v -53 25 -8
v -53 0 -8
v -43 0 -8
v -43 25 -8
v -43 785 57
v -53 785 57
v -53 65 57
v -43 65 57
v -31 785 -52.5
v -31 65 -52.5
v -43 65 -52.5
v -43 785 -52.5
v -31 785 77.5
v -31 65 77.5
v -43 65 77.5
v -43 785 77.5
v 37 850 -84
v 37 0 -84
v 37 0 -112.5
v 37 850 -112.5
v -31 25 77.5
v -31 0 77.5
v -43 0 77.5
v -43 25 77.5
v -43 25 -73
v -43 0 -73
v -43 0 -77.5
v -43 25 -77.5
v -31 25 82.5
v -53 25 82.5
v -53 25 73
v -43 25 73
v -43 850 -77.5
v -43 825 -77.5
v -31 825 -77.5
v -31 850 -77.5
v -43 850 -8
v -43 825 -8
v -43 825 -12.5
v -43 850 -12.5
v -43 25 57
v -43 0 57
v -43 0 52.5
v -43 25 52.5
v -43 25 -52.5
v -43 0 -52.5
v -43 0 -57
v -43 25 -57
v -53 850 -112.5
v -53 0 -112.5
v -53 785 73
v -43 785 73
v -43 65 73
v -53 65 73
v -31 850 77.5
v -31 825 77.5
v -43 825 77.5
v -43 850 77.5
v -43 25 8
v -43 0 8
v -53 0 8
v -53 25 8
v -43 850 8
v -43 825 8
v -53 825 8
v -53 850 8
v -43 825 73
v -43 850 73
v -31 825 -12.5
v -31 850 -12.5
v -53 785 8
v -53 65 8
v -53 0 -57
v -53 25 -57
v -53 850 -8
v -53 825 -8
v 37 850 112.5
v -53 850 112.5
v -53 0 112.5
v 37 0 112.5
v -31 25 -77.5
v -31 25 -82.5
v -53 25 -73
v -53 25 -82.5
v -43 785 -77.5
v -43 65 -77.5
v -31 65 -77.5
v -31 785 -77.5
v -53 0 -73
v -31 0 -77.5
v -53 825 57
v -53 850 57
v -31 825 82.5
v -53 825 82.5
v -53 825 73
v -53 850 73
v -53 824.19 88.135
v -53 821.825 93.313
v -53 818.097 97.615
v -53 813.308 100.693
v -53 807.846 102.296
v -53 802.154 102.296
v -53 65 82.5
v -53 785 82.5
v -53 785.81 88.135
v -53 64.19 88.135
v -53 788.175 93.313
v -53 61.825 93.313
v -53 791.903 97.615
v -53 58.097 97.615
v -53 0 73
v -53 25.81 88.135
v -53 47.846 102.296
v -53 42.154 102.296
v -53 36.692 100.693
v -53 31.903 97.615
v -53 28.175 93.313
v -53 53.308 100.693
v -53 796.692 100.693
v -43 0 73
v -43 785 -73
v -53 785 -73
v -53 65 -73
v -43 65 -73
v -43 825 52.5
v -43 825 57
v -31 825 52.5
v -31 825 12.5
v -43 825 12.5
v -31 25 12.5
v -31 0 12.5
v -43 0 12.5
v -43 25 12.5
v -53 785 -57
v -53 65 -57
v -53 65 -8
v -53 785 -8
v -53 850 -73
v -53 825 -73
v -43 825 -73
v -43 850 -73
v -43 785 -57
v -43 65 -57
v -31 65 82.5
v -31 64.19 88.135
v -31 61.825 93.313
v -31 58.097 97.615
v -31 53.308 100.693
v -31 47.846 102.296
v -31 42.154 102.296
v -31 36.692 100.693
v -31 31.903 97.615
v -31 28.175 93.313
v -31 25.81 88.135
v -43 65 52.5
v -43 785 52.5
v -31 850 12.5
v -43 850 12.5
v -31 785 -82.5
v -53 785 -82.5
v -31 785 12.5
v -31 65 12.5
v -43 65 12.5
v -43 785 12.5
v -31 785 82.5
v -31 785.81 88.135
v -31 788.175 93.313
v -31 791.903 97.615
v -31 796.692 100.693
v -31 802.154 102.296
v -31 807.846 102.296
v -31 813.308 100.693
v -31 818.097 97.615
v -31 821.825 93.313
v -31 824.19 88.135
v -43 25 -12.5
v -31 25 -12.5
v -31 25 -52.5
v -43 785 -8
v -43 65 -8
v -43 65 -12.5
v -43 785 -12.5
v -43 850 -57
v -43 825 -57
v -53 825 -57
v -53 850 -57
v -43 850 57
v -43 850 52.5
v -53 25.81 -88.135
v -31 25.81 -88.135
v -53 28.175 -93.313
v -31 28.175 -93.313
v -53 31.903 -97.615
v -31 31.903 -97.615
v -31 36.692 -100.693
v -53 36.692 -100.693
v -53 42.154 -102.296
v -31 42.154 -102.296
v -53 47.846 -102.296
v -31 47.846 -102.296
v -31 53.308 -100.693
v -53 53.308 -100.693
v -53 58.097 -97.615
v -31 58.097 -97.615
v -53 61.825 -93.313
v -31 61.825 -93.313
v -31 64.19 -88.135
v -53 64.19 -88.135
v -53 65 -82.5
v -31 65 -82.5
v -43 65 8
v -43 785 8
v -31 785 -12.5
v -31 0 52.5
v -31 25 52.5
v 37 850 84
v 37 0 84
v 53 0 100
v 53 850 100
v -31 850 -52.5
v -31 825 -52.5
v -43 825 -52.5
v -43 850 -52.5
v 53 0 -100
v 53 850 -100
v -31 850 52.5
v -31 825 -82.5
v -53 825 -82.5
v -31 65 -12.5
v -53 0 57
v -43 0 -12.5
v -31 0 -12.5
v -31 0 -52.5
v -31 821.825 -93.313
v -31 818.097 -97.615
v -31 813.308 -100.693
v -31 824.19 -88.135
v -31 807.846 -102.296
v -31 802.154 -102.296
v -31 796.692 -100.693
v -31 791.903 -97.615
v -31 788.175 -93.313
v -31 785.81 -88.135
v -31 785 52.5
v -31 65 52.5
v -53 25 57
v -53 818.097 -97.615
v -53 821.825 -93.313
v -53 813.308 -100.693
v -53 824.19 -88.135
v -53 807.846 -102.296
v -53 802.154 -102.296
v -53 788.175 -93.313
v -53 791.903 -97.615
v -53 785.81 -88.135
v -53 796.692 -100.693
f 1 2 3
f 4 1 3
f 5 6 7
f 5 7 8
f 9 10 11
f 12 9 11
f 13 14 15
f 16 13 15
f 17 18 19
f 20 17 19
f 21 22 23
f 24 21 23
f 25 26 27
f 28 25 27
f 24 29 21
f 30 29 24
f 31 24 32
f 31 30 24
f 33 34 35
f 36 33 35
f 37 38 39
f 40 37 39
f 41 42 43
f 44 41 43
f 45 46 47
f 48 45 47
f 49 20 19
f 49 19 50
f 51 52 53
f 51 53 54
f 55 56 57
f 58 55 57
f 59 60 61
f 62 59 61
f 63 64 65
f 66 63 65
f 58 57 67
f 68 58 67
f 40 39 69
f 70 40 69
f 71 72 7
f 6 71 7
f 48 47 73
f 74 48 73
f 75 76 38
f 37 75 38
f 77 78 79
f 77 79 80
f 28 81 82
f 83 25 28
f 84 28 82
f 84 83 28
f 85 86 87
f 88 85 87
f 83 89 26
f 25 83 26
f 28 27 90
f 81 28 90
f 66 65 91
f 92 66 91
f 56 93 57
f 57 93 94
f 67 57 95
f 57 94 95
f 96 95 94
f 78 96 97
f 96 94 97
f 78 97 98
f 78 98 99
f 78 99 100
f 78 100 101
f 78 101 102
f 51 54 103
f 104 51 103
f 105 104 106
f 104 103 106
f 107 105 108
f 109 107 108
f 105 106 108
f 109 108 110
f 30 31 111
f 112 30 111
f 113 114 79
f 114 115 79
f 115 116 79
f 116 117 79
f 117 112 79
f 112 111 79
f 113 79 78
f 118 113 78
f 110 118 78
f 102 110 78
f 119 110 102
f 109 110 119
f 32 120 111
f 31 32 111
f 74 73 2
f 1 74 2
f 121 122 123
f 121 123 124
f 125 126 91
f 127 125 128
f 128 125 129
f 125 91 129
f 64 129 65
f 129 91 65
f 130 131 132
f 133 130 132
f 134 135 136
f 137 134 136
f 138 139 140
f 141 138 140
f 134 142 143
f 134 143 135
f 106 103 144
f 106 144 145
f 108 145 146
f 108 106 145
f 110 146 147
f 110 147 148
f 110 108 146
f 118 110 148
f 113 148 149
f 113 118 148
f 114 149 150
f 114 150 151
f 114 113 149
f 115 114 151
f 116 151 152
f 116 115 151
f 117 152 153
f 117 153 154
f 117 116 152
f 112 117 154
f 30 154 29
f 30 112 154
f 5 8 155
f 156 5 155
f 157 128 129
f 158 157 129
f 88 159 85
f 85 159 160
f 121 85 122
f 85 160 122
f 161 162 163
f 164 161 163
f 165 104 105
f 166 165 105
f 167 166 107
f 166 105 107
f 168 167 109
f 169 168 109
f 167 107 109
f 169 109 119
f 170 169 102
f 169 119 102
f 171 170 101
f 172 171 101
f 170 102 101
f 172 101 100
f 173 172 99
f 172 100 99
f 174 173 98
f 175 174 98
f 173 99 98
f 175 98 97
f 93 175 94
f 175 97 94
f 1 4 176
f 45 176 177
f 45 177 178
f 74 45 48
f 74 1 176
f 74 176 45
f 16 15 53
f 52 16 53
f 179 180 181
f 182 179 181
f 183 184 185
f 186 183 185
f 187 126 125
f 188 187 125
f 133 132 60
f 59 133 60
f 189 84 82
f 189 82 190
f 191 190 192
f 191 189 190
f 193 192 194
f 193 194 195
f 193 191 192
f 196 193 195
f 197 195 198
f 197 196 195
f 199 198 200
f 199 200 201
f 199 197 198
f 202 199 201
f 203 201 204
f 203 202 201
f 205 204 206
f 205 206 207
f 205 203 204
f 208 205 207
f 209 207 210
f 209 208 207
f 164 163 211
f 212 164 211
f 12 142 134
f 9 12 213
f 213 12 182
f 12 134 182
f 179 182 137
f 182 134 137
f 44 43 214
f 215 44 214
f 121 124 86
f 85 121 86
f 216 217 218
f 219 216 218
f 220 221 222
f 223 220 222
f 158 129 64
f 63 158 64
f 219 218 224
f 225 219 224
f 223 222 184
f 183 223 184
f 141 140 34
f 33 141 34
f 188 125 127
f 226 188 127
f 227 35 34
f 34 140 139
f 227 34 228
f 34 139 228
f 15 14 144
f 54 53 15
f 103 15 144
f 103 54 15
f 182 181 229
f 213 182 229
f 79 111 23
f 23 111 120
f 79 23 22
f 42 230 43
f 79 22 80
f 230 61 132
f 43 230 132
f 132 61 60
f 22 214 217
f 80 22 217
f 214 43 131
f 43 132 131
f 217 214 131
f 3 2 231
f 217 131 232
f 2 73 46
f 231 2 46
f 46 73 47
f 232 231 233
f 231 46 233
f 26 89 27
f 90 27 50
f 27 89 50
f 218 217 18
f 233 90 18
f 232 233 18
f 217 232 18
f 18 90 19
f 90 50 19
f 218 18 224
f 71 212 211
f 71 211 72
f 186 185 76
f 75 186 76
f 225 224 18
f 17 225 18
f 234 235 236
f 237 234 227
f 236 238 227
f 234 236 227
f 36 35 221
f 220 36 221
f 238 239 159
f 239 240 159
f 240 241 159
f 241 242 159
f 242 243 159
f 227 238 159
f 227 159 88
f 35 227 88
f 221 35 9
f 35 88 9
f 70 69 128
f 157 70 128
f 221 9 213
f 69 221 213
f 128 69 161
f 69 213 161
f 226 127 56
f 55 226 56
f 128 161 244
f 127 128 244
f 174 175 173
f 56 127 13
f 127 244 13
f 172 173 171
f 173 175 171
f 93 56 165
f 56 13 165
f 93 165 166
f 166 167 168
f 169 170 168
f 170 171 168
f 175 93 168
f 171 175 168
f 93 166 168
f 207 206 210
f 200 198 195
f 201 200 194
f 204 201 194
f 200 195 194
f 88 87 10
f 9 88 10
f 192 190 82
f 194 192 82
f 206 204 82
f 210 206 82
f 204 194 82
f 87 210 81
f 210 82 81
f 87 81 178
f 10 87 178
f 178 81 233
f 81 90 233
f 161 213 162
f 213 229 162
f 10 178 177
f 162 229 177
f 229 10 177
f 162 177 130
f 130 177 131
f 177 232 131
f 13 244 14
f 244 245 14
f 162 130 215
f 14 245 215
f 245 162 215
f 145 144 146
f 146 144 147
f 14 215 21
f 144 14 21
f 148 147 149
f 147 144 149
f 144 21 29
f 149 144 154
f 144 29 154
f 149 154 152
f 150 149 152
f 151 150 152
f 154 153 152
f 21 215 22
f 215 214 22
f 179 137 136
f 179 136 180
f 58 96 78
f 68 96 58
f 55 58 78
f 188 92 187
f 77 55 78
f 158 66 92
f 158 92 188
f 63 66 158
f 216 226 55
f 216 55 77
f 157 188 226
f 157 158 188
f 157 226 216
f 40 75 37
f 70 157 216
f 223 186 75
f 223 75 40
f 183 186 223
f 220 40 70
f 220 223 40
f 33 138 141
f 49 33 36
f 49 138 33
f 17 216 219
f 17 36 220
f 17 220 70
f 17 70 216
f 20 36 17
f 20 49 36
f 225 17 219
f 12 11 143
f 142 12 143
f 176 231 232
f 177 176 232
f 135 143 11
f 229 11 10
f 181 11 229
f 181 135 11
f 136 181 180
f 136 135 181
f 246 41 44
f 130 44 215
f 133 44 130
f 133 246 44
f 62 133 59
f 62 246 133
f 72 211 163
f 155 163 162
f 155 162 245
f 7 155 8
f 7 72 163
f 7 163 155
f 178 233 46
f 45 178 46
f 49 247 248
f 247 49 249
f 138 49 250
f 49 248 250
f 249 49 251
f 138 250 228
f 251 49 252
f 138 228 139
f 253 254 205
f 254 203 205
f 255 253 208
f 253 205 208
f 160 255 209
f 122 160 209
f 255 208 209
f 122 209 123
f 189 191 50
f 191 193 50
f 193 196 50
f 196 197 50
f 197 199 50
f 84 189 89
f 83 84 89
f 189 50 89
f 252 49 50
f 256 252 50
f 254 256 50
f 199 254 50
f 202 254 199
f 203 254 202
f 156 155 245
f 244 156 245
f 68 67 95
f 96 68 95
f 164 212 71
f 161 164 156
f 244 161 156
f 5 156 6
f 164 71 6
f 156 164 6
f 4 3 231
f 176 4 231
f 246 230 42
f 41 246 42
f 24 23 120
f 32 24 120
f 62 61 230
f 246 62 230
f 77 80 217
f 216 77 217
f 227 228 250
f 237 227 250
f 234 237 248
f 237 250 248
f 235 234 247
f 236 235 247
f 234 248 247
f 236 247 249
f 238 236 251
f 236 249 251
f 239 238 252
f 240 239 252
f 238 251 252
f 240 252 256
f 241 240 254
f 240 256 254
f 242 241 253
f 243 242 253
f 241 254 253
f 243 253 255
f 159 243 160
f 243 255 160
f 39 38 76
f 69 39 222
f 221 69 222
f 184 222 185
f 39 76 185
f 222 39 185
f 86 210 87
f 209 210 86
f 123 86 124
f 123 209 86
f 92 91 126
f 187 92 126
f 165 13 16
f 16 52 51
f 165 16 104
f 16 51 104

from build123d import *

# Parameters (mm, degrees)
BOSS_EXTRUDE1_DEPTH = 850
CUT_EXTRUDE1_DEPTH  = 22


with BuildPart() as part:
    # Sketch1 → Boss-Extrude1 (new body)
    with BuildSketch(Plane(origin=(0, 0, 0), x_dir=(1, 0, 0), z_dir=(0, 1, 0))):
        Polygon((-53, -73), (-53, -112.5), (37, -112.5), (37, -84), (53, -100), (53, 100), (37, 84), (37, 112.5), (-53, 112.5), (-53, 73), (-43, 73), (-43, 77.5), (-31, 77.5), (-31, 52.5), (-43, 52.5), (-43, 57), (-53, 57), (-53, 8), (-43, 8), (-43, 12.5), (-31, 12.5), (-31, -12.5), (-43, -12.5), (-43, -8), (-53, -8), (-53, -57), (-43, -57), (-43, -52.5), (-31, -52.5), (-31, -77.5), (-43, -77.5), (-43, -73), align=None)
    extrude(amount=BOSS_EXTRUDE1_DEPTH)

    # Sketch2 → Cut-Extrude1 (cut)
    with BuildSketch(Plane.ZY.offset(53)):
        with BuildLine():
            Line((-82.5, 65), (82.5, 65))
            ThreePointArc((82.5, 65), (102.5, 45), (82.5, 25))
            Line((82.5, 25), (-82.5, 25))
            ThreePointArc((-82.5, 25), (-102.5, 45), (-82.5, 65))
        make_face()
        with BuildLine():
            Line((-82.5, 785), (82.5, 785))
            ThreePointArc((82.5, 785), (102.5, 805), (82.5, 825))
            Line((82.5, 825), (-82.5, 825))
            ThreePointArc((-82.5, 825), (-102.5, 805), (-82.5, 785))
        make_face()
    extrude(amount=-CUT_EXTRUDE1_DEPTH, mode=Mode.SUBTRACT)


solid = part.part
